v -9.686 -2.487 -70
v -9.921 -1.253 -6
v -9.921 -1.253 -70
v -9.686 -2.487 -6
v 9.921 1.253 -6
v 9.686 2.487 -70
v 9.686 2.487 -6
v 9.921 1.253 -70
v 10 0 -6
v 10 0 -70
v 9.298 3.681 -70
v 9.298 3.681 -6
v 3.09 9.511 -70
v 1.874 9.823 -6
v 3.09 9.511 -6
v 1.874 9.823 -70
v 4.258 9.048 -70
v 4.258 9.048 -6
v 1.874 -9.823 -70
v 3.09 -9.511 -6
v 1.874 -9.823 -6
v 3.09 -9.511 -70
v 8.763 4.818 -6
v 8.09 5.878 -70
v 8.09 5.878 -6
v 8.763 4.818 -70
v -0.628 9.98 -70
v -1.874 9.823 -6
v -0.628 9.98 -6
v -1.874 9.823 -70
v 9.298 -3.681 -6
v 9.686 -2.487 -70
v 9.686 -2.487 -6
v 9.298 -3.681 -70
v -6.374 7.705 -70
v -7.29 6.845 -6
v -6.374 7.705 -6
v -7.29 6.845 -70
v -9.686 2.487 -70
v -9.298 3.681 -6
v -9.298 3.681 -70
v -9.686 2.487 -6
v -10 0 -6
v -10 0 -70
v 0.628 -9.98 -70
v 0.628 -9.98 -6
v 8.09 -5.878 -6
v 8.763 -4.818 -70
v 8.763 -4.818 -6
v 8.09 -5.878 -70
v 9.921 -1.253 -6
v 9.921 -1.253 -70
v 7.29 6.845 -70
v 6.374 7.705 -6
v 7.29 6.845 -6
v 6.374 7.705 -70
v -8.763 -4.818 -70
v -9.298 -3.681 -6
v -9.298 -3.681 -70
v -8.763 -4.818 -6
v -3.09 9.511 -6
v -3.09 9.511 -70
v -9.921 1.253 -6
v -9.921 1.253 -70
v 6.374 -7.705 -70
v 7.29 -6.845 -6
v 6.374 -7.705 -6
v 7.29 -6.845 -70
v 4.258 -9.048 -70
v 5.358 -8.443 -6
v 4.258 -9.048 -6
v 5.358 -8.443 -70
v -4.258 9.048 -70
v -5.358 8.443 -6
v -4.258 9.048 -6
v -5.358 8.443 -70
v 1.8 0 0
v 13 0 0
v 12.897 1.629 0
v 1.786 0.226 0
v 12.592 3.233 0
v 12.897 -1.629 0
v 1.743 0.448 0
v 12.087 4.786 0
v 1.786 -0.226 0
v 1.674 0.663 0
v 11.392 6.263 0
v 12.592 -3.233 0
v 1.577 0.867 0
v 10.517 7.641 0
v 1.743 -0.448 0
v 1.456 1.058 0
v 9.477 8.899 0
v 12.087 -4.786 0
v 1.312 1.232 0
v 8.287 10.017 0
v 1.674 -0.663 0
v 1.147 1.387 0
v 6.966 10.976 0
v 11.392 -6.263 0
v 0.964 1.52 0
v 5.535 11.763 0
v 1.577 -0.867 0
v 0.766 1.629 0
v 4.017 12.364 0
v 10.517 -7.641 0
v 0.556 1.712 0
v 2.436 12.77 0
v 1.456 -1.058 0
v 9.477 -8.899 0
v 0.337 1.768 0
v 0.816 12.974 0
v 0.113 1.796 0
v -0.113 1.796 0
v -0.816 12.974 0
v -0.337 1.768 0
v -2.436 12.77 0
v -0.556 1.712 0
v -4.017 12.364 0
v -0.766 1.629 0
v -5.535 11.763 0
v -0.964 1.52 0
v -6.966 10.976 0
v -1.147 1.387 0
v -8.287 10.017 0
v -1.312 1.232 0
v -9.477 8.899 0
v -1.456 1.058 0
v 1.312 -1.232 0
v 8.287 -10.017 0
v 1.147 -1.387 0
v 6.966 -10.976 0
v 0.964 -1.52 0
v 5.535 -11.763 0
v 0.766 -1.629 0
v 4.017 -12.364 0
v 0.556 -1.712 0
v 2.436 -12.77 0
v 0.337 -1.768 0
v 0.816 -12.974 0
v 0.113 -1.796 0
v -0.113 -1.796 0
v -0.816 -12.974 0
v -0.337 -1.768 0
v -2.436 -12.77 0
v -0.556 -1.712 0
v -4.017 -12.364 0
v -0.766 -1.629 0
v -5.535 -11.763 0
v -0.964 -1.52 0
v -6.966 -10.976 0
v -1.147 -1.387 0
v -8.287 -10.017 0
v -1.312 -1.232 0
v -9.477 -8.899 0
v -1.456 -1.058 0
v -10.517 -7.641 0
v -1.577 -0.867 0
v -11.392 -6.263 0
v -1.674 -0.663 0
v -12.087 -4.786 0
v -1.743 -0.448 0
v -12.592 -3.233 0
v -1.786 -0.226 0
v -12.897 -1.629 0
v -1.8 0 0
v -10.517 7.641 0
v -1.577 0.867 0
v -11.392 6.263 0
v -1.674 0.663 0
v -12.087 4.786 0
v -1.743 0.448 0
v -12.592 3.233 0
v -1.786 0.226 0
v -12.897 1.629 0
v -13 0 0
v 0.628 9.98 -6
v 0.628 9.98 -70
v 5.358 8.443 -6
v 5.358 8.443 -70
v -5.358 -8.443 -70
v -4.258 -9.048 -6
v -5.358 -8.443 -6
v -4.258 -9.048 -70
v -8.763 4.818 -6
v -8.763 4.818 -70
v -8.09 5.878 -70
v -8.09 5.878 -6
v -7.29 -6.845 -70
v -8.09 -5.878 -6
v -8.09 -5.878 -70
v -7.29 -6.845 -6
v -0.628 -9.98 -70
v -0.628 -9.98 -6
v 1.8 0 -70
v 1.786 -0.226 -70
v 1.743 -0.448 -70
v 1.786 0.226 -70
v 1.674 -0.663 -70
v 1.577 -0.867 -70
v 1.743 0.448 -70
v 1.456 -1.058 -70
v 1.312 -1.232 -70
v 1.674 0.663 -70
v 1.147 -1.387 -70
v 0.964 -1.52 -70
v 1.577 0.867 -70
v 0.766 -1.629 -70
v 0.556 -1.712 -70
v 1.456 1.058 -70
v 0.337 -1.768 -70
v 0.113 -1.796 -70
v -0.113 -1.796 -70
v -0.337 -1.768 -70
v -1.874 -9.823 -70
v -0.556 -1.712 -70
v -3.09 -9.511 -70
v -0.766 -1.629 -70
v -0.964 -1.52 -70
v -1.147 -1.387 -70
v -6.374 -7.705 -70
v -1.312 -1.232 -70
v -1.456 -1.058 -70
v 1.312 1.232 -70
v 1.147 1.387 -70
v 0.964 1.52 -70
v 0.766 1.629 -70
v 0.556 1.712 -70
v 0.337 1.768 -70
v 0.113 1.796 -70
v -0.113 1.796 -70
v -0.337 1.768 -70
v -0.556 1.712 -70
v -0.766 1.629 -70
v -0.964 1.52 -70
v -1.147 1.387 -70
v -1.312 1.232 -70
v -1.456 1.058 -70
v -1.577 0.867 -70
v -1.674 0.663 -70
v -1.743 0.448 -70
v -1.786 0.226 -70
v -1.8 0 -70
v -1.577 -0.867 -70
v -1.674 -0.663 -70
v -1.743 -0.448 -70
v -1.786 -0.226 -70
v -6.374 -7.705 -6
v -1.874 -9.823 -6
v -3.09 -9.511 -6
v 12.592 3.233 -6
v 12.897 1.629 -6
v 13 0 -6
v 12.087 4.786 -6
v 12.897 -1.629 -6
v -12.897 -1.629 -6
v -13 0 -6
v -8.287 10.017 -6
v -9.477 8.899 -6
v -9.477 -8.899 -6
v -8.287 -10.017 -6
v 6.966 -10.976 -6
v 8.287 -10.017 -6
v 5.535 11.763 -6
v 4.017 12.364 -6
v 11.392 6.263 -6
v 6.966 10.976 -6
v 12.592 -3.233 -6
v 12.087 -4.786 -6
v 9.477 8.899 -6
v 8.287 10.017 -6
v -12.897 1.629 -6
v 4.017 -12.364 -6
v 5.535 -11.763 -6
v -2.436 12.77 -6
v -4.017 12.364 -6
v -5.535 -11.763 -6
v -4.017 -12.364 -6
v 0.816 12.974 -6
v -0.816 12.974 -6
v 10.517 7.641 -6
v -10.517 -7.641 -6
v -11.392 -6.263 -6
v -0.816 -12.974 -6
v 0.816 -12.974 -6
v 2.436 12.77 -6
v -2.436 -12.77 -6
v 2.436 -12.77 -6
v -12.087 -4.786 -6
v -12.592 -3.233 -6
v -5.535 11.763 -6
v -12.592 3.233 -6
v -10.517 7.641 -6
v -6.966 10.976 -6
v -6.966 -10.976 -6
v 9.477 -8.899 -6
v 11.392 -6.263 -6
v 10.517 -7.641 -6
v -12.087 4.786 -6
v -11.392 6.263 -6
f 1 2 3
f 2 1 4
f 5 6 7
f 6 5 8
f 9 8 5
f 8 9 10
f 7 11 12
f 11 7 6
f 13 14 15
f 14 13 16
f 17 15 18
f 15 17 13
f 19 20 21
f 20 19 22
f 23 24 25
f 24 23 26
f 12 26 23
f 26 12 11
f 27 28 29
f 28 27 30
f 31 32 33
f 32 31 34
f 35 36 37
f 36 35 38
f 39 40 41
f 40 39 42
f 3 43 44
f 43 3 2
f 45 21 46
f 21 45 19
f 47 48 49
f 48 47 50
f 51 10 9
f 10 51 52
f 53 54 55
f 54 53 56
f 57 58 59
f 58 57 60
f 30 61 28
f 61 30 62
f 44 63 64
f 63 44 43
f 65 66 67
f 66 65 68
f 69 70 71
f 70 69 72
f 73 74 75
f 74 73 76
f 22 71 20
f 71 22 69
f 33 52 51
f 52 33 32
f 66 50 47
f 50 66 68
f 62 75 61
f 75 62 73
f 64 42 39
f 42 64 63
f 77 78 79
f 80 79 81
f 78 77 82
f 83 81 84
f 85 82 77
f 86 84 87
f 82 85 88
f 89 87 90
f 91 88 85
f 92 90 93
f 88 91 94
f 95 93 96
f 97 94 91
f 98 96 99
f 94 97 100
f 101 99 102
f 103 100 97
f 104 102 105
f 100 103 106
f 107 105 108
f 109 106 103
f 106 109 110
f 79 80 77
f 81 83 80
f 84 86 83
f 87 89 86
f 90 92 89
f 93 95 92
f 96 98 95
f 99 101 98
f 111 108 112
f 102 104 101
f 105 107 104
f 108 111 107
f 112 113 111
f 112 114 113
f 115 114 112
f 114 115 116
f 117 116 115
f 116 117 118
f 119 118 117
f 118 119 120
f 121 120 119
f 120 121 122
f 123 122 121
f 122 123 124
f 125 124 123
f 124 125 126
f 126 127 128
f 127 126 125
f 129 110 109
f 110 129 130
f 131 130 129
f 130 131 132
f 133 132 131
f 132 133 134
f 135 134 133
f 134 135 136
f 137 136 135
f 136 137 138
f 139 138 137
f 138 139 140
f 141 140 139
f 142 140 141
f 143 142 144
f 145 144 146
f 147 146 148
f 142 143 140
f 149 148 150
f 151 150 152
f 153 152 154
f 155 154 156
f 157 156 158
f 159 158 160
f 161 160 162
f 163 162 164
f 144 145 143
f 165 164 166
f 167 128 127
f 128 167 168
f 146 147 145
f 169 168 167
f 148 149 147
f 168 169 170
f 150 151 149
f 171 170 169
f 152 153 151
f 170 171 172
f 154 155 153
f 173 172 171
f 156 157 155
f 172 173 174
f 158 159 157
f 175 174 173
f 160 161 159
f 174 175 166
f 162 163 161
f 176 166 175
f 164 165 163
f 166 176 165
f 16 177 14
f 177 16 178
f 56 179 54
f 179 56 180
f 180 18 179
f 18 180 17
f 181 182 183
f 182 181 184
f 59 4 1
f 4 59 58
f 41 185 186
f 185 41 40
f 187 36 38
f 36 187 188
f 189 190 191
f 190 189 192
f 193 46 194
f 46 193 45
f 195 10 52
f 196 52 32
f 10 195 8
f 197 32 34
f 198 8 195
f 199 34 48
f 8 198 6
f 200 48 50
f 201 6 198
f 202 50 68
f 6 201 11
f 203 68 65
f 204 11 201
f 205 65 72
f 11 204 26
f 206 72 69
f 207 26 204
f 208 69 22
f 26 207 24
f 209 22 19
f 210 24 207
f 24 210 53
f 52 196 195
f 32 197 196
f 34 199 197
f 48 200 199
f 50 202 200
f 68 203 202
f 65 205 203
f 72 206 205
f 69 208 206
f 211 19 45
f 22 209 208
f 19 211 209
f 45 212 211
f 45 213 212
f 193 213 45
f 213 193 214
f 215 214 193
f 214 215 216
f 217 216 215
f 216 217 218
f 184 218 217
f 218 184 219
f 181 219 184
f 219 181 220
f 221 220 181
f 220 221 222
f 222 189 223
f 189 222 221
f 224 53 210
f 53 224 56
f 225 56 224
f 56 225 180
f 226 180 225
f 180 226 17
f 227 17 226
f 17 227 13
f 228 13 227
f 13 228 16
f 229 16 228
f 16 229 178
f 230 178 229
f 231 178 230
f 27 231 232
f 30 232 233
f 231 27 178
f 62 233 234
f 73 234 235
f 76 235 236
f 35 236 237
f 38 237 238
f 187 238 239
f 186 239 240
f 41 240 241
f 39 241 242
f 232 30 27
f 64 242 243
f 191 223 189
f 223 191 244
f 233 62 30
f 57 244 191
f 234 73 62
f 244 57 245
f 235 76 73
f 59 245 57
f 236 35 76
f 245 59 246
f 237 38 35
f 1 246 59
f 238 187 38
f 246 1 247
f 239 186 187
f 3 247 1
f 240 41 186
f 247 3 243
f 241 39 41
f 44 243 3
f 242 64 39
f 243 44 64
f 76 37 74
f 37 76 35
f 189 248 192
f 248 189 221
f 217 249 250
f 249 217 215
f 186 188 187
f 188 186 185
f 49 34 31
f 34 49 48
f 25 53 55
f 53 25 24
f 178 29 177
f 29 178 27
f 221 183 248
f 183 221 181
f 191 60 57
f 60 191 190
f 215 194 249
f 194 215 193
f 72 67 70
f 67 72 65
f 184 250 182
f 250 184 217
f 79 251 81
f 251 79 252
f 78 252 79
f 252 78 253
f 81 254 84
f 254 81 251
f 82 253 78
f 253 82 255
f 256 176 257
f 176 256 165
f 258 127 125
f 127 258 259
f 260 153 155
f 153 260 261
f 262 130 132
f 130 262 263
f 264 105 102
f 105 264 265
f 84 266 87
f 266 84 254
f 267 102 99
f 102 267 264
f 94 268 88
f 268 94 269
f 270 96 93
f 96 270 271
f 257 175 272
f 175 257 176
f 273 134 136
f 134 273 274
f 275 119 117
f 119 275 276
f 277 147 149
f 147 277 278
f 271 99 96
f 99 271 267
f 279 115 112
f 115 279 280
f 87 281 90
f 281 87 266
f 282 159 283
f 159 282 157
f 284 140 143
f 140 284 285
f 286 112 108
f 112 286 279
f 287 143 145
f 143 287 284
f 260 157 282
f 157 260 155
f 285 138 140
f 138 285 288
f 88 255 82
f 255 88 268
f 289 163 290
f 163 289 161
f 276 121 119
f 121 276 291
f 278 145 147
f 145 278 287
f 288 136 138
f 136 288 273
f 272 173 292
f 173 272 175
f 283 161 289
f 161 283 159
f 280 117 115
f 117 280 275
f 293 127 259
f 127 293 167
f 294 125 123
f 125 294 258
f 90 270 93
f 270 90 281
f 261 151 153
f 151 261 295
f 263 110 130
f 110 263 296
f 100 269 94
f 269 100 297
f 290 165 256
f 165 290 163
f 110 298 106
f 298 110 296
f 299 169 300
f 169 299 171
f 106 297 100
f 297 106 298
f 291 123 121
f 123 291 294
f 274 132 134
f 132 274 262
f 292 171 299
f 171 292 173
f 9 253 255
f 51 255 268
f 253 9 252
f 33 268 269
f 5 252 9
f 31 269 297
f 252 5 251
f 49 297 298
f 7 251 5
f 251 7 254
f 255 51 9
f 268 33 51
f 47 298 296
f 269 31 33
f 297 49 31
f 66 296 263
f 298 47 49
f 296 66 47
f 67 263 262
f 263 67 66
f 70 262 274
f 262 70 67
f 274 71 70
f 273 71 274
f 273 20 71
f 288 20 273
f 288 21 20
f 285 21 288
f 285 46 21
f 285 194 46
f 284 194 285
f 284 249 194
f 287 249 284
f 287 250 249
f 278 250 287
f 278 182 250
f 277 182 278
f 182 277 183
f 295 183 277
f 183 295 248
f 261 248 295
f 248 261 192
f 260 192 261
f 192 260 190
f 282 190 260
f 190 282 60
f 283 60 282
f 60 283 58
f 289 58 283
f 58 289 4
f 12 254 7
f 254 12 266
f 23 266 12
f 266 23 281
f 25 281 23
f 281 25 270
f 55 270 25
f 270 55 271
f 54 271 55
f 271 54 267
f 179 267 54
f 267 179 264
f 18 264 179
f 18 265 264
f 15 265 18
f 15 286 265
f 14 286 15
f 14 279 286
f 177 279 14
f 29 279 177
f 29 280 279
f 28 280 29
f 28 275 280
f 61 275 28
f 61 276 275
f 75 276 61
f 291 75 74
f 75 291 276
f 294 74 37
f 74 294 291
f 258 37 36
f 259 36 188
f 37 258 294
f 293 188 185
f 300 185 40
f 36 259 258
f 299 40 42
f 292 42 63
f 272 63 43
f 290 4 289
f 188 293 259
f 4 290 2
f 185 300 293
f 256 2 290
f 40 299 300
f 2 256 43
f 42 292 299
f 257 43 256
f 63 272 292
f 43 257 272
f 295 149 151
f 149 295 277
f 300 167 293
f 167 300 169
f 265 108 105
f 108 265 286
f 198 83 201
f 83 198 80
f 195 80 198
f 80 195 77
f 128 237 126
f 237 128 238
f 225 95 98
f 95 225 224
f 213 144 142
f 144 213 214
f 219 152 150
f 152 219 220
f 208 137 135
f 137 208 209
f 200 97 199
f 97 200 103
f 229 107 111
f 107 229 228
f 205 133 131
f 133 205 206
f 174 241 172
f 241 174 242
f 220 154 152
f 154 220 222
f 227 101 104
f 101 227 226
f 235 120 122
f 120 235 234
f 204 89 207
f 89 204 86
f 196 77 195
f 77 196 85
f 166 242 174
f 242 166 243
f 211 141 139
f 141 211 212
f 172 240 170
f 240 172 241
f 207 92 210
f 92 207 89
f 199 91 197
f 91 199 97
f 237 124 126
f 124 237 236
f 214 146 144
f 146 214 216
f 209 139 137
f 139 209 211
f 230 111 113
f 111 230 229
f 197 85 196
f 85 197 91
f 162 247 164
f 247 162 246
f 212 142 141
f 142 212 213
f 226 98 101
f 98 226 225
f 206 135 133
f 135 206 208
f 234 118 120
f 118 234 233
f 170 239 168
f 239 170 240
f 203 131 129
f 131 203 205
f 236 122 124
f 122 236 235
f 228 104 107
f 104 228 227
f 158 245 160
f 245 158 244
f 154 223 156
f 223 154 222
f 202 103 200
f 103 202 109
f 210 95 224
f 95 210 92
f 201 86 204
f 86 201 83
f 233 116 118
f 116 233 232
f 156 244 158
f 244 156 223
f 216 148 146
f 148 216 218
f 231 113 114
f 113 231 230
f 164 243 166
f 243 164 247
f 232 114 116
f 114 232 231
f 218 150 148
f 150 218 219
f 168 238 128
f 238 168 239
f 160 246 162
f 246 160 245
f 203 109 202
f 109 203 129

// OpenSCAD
$fn = 50;


difference() {
	union() {
		translate(v = [0, 0, -70.0000000000]) {
			cylinder(h = 70, r = 10.0000000000);
		}
		translate(v = [0, 0, -6.0000000000]) {
			cylinder(h = 6, r = 13.0000000000);
		}
	}
	union() {
		#translate(v = [0, 0, -70]) {
			cylinder(h = 70, r = 1.8000000000);
		}
	}
}
